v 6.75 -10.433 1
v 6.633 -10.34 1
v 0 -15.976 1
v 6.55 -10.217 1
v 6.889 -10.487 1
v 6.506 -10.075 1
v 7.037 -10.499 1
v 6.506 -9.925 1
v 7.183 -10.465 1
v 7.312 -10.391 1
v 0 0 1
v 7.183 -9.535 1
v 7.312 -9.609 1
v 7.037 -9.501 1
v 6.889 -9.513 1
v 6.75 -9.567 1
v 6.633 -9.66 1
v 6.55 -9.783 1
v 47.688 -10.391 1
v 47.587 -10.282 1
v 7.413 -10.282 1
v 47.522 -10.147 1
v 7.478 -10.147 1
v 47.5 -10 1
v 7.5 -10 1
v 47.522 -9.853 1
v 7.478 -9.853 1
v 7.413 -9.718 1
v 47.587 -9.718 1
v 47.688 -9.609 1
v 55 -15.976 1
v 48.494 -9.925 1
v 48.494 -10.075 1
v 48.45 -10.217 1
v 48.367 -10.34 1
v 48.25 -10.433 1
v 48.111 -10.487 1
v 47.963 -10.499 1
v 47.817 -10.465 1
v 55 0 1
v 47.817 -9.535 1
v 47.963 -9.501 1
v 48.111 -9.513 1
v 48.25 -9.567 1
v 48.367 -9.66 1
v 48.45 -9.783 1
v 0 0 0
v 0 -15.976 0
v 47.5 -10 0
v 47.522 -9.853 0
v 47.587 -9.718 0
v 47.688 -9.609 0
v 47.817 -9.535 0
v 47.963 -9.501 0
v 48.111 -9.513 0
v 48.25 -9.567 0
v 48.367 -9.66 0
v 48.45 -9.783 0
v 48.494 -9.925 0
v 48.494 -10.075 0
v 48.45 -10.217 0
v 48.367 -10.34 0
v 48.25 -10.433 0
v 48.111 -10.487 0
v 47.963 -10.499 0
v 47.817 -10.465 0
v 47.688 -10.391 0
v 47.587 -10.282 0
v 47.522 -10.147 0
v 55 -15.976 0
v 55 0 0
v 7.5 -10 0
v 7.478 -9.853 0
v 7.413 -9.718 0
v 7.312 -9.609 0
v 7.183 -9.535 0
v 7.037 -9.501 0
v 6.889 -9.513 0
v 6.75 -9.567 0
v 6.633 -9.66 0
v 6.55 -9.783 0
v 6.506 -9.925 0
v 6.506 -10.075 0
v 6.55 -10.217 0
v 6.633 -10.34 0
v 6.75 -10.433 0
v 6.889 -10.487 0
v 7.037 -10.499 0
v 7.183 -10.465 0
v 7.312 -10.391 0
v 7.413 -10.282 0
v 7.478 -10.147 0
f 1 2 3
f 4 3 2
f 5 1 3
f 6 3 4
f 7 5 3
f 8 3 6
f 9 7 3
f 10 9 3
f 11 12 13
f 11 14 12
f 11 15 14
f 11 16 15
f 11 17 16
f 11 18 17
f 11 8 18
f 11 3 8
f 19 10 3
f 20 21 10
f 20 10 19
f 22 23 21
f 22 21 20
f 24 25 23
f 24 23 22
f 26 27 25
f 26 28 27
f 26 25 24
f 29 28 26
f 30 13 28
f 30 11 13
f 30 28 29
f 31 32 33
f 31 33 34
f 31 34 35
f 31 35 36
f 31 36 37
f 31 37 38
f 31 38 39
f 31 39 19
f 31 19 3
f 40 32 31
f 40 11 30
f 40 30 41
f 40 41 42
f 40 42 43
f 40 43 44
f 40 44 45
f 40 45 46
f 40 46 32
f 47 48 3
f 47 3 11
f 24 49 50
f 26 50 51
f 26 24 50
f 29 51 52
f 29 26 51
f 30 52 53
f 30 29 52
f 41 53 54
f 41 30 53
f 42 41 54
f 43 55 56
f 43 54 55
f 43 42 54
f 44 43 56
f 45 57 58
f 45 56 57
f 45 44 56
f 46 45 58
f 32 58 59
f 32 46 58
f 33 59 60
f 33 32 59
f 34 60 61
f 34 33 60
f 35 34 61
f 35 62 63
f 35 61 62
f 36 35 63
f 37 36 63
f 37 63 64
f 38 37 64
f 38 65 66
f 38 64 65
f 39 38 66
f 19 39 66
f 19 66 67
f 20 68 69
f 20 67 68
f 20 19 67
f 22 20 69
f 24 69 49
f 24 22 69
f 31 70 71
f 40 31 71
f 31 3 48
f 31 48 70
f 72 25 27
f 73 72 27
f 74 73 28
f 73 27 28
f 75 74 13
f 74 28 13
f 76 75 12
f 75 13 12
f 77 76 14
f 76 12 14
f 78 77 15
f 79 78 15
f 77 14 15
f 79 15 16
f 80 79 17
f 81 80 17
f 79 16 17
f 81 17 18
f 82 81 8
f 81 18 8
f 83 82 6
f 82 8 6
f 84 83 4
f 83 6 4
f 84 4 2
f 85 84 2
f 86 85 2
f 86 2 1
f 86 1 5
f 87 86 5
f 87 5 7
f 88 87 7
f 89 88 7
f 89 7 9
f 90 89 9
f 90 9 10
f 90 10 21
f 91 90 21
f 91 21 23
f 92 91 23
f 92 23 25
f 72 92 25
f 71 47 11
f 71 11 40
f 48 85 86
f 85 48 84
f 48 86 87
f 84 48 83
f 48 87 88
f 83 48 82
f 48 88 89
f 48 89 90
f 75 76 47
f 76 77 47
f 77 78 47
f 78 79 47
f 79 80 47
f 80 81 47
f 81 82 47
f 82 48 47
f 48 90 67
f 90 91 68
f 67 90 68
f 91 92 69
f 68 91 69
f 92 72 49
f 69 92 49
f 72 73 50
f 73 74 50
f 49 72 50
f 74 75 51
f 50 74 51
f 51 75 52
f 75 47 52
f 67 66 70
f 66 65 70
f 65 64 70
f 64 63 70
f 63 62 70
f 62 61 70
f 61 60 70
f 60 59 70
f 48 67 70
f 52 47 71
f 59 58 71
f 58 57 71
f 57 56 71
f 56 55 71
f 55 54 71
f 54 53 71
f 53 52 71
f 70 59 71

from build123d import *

# Parameters (mm, degrees)
SKETCH1_W           = 55
SKETCH1_H           = 20
BOSS_EXTRUDE1_DEPTH = 1
SKETCH2_R           = 0.5
CUT_EXTRUDE1_DEPTH  = 59.532042507
SKETCH4_W           = 55
SKETCH4_H           = 4.024392025
CUT_EXTRUDE3_DEPTH  = 5


with BuildPart() as part:
    # Sketch1 → Boss-Extrude1 (new body)
    with BuildSketch(Plane.XY):
        with Locations((27.5, -10)):
            Rectangle(SKETCH1_W, SKETCH1_H)
    extrude(amount=BOSS_EXTRUDE1_DEPTH)

    # Sketch2 → Cut-Extrude1 (cut, through all)
    with BuildSketch(Plane.XY.offset(1)):
        with Locations((7, -10)):
            Circle(SKETCH2_R)
    cut_extrude1 = extrude(amount=-CUT_EXTRUDE1_DEPTH, mode=Mode.SUBTRACT)

    # Mirror2: Cut-Extrude1 across plane
    add(cut_extrude1.mirror(Plane.ZY.offset(-27.5)), mode=Mode.SUBTRACT)

    # Sketch4 → Cut-Extrude3 (cut)
    with BuildSketch(Plane.XY.offset(1)):
        with Locations((27.5, -17.987803988)):
            Rectangle(SKETCH4_W, SKETCH4_H)
    extrude(amount=-CUT_EXTRUDE3_DEPTH, mode=Mode.SUBTRACT)


solid = part.part
